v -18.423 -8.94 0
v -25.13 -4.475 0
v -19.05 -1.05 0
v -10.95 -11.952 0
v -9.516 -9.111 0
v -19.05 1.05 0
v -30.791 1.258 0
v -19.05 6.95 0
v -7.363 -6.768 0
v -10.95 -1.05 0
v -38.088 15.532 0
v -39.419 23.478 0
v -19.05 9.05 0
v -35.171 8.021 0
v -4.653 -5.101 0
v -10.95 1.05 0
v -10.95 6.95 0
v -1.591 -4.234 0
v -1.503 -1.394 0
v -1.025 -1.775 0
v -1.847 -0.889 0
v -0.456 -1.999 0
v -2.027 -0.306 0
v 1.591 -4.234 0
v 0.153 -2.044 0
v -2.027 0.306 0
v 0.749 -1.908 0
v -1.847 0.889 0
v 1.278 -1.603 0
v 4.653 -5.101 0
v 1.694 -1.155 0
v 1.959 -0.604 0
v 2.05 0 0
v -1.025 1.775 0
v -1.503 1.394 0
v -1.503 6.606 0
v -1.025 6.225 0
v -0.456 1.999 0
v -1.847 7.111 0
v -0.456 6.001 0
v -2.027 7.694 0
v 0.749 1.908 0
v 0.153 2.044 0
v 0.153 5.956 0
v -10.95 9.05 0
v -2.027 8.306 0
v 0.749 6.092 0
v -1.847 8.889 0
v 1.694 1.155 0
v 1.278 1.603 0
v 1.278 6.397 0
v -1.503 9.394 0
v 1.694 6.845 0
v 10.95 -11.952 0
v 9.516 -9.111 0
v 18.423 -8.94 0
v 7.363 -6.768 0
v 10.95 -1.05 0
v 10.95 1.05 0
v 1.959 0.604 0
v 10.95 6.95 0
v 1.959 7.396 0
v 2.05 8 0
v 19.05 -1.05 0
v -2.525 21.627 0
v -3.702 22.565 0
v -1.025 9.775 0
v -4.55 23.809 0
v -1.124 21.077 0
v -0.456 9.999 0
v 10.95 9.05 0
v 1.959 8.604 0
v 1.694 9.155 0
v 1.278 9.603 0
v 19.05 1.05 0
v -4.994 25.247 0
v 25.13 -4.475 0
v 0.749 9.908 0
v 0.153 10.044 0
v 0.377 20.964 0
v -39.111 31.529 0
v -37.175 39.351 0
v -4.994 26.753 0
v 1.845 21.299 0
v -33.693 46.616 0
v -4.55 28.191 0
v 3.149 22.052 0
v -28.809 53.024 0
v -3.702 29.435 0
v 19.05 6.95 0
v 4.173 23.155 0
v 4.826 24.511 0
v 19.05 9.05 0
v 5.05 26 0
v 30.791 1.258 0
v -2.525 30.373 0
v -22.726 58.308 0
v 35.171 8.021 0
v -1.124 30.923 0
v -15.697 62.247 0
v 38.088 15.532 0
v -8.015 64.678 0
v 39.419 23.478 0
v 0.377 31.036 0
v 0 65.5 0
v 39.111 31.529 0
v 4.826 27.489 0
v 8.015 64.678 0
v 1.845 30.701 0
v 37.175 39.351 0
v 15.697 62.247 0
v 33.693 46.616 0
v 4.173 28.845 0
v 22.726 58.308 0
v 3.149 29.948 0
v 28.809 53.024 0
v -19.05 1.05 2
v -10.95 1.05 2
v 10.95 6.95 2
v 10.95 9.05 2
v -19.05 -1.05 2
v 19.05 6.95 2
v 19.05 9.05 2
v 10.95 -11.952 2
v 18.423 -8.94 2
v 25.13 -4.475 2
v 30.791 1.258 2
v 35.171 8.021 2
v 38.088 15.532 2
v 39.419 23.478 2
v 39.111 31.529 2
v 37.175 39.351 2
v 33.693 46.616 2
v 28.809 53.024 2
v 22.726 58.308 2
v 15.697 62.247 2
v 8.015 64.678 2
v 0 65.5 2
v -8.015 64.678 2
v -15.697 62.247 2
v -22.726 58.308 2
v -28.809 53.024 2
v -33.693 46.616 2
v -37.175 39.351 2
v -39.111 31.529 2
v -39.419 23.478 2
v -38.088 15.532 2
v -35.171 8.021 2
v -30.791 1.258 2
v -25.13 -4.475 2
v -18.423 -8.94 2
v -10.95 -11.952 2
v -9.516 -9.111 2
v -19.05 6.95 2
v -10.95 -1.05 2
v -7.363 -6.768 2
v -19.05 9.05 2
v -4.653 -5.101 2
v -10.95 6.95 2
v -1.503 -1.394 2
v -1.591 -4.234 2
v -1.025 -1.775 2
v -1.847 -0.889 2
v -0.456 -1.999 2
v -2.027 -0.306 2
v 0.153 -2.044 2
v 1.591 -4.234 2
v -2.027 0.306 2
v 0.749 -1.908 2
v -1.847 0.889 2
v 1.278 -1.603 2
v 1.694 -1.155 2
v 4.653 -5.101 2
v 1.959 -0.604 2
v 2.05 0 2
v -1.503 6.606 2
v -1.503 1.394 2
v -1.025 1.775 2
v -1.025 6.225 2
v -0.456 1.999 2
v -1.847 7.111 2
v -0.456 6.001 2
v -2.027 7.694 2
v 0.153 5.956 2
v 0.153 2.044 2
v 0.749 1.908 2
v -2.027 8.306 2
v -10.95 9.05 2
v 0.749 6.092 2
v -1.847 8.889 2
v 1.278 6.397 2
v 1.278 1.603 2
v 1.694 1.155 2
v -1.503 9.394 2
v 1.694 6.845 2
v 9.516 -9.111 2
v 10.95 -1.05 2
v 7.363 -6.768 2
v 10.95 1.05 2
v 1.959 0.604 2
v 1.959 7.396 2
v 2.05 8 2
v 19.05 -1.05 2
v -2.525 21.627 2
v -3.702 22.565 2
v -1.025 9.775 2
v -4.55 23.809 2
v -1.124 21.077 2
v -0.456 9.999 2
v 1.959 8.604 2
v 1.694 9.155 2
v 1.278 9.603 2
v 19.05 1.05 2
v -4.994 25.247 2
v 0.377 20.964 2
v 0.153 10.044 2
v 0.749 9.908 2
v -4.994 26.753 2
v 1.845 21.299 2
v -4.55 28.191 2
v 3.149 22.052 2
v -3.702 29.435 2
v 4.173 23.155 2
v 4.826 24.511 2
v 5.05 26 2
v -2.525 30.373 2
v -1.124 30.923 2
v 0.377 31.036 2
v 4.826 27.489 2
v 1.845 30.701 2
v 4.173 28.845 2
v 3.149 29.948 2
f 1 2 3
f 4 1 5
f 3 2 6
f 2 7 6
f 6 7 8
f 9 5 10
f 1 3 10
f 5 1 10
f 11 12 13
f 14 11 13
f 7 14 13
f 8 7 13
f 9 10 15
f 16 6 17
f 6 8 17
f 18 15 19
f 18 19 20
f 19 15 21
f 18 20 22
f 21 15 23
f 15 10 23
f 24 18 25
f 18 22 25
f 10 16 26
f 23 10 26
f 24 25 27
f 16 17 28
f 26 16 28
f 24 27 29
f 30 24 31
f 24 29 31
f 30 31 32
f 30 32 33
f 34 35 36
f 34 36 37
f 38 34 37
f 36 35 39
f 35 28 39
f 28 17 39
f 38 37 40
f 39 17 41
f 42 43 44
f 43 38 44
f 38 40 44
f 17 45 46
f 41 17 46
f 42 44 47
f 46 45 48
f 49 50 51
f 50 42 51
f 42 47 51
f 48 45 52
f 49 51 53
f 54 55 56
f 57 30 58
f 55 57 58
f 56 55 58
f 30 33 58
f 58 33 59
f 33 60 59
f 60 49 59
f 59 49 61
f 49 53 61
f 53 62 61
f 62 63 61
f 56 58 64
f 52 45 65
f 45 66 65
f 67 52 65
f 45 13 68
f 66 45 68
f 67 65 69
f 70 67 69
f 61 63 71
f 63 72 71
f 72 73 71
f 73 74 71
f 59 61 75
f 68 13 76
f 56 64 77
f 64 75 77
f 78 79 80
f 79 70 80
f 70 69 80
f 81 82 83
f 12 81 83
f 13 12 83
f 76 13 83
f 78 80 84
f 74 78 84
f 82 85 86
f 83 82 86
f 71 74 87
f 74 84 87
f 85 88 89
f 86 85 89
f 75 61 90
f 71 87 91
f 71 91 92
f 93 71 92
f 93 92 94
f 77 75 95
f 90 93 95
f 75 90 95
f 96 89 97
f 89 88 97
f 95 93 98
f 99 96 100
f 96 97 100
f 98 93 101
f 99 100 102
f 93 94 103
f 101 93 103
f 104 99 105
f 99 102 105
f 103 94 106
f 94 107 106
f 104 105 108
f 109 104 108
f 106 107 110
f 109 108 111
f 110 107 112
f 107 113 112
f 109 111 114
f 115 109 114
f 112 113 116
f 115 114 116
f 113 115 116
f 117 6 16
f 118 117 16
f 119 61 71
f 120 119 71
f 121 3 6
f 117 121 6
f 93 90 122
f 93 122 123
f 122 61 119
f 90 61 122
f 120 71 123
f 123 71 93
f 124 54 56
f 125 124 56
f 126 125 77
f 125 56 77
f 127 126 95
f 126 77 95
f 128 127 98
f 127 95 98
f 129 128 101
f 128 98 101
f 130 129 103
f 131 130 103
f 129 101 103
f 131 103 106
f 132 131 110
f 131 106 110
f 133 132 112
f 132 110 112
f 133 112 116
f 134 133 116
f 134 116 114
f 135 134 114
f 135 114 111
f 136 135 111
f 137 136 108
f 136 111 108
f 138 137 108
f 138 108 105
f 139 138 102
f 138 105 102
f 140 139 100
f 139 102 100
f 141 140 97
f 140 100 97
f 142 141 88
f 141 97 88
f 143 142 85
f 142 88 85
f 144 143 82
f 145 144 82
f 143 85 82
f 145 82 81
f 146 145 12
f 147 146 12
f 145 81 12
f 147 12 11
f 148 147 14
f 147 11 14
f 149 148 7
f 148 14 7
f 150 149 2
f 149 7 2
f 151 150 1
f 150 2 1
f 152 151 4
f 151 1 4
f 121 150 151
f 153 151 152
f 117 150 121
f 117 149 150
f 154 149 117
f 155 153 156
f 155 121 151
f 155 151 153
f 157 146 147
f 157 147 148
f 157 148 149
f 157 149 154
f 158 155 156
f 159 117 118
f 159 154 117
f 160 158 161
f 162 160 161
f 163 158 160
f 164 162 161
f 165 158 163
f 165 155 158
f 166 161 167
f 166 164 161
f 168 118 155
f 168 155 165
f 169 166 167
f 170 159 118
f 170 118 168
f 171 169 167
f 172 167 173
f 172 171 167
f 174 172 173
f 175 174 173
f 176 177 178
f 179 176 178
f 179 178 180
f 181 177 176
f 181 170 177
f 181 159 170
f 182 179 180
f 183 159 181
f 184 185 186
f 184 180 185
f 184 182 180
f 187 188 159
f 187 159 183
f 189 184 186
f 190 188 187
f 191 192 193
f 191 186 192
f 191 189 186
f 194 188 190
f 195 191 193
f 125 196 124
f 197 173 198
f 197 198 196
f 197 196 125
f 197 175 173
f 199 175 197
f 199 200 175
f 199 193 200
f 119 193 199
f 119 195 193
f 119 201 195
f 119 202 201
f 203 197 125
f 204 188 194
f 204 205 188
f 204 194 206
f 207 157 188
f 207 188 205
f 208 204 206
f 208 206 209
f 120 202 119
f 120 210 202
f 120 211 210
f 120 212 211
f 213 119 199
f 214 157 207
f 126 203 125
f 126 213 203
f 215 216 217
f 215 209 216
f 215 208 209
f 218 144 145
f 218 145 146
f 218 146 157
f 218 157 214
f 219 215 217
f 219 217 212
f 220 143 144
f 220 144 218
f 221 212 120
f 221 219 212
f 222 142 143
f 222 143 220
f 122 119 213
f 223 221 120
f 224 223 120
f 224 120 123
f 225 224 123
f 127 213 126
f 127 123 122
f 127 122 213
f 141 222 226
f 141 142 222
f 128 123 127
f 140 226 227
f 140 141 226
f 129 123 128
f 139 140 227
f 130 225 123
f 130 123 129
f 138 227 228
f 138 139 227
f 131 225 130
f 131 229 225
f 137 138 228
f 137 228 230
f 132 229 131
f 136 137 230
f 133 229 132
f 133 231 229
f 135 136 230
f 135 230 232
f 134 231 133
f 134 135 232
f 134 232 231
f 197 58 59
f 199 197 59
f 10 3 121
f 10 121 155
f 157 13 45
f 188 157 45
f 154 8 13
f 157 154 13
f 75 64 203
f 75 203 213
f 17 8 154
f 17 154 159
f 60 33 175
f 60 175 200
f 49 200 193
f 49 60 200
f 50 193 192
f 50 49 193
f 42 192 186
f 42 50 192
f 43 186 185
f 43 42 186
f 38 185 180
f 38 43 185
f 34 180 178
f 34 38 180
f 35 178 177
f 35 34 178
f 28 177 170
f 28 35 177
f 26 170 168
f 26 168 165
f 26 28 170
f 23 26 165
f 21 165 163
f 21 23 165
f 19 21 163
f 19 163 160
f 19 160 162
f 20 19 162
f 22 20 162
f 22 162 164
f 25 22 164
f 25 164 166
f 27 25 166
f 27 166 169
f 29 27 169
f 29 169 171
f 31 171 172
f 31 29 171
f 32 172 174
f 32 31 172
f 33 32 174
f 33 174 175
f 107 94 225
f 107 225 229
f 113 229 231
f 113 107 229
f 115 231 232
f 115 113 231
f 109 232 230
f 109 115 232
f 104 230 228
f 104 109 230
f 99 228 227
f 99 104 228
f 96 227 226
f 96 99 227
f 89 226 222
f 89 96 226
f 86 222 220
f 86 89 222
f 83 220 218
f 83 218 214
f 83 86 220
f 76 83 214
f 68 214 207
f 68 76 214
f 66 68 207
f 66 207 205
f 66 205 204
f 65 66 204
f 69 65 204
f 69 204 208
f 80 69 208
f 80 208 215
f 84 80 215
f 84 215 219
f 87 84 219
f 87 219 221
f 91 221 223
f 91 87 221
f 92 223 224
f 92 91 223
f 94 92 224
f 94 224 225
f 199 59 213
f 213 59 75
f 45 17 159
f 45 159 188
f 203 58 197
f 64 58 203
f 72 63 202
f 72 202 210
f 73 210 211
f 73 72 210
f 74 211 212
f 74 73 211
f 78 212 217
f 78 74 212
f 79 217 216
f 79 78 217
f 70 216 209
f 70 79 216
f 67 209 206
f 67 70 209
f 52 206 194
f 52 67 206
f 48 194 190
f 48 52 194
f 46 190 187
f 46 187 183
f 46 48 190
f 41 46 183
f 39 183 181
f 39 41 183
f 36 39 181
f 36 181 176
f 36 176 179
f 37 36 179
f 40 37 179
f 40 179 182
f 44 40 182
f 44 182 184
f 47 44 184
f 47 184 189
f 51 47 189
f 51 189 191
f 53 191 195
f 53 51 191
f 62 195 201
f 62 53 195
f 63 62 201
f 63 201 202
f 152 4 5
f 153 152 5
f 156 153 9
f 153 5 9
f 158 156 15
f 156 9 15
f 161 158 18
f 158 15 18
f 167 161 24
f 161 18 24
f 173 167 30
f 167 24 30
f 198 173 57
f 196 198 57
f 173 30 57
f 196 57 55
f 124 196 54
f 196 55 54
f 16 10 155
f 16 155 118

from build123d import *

# Parameters (mm, degrees)
SKETCH_1_R      = 2.05
SKETCH_1_R_2    = 5.05
SKETCH_1_W      = 8.1
SKETCH_1_H      = 2.1
EXTRUDE_1_DEPTH = 2


with BuildPart() as part:
    # 草图1 → 凸台-拉伸1 (new body)
    with BuildSketch(Plane.XY):
        with BuildLine():
            ThreePointArc((-10.95, -11.95191036), (0, -4.124206955), (10.95, -11.95191036))
            ThreePointArc((10.95, -11.95191036), (0, 65.5), (-10.95, -11.95191036))
        make_face()
        Circle(SKETCH_1_R, mode=Mode.SUBTRACT)
        with Locations((0, 8)):
            Circle(SKETCH_1_R, mode=Mode.SUBTRACT)
        with Locations((0, 26)):
            Circle(SKETCH_1_R_2, mode=Mode.SUBTRACT)
        with Locations((-15, 8)):
            Rectangle(SKETCH_1_W, SKETCH_1_H, mode=Mode.SUBTRACT)
        with Locations((-15, 0)):
            Rectangle(SKETCH_1_W, SKETCH_1_H, mode=Mode.SUBTRACT)
        with Locations((15, 8)):
            Rectangle(SKETCH_1_W, SKETCH_1_H, mode=Mode.SUBTRACT)
        with Locations((15, 0)):
            Rectangle(SKETCH_1_W, SKETCH_1_H, mode=Mode.SUBTRACT)
    extrude(amount=EXTRUDE_1_DEPTH)


solid = part.part
